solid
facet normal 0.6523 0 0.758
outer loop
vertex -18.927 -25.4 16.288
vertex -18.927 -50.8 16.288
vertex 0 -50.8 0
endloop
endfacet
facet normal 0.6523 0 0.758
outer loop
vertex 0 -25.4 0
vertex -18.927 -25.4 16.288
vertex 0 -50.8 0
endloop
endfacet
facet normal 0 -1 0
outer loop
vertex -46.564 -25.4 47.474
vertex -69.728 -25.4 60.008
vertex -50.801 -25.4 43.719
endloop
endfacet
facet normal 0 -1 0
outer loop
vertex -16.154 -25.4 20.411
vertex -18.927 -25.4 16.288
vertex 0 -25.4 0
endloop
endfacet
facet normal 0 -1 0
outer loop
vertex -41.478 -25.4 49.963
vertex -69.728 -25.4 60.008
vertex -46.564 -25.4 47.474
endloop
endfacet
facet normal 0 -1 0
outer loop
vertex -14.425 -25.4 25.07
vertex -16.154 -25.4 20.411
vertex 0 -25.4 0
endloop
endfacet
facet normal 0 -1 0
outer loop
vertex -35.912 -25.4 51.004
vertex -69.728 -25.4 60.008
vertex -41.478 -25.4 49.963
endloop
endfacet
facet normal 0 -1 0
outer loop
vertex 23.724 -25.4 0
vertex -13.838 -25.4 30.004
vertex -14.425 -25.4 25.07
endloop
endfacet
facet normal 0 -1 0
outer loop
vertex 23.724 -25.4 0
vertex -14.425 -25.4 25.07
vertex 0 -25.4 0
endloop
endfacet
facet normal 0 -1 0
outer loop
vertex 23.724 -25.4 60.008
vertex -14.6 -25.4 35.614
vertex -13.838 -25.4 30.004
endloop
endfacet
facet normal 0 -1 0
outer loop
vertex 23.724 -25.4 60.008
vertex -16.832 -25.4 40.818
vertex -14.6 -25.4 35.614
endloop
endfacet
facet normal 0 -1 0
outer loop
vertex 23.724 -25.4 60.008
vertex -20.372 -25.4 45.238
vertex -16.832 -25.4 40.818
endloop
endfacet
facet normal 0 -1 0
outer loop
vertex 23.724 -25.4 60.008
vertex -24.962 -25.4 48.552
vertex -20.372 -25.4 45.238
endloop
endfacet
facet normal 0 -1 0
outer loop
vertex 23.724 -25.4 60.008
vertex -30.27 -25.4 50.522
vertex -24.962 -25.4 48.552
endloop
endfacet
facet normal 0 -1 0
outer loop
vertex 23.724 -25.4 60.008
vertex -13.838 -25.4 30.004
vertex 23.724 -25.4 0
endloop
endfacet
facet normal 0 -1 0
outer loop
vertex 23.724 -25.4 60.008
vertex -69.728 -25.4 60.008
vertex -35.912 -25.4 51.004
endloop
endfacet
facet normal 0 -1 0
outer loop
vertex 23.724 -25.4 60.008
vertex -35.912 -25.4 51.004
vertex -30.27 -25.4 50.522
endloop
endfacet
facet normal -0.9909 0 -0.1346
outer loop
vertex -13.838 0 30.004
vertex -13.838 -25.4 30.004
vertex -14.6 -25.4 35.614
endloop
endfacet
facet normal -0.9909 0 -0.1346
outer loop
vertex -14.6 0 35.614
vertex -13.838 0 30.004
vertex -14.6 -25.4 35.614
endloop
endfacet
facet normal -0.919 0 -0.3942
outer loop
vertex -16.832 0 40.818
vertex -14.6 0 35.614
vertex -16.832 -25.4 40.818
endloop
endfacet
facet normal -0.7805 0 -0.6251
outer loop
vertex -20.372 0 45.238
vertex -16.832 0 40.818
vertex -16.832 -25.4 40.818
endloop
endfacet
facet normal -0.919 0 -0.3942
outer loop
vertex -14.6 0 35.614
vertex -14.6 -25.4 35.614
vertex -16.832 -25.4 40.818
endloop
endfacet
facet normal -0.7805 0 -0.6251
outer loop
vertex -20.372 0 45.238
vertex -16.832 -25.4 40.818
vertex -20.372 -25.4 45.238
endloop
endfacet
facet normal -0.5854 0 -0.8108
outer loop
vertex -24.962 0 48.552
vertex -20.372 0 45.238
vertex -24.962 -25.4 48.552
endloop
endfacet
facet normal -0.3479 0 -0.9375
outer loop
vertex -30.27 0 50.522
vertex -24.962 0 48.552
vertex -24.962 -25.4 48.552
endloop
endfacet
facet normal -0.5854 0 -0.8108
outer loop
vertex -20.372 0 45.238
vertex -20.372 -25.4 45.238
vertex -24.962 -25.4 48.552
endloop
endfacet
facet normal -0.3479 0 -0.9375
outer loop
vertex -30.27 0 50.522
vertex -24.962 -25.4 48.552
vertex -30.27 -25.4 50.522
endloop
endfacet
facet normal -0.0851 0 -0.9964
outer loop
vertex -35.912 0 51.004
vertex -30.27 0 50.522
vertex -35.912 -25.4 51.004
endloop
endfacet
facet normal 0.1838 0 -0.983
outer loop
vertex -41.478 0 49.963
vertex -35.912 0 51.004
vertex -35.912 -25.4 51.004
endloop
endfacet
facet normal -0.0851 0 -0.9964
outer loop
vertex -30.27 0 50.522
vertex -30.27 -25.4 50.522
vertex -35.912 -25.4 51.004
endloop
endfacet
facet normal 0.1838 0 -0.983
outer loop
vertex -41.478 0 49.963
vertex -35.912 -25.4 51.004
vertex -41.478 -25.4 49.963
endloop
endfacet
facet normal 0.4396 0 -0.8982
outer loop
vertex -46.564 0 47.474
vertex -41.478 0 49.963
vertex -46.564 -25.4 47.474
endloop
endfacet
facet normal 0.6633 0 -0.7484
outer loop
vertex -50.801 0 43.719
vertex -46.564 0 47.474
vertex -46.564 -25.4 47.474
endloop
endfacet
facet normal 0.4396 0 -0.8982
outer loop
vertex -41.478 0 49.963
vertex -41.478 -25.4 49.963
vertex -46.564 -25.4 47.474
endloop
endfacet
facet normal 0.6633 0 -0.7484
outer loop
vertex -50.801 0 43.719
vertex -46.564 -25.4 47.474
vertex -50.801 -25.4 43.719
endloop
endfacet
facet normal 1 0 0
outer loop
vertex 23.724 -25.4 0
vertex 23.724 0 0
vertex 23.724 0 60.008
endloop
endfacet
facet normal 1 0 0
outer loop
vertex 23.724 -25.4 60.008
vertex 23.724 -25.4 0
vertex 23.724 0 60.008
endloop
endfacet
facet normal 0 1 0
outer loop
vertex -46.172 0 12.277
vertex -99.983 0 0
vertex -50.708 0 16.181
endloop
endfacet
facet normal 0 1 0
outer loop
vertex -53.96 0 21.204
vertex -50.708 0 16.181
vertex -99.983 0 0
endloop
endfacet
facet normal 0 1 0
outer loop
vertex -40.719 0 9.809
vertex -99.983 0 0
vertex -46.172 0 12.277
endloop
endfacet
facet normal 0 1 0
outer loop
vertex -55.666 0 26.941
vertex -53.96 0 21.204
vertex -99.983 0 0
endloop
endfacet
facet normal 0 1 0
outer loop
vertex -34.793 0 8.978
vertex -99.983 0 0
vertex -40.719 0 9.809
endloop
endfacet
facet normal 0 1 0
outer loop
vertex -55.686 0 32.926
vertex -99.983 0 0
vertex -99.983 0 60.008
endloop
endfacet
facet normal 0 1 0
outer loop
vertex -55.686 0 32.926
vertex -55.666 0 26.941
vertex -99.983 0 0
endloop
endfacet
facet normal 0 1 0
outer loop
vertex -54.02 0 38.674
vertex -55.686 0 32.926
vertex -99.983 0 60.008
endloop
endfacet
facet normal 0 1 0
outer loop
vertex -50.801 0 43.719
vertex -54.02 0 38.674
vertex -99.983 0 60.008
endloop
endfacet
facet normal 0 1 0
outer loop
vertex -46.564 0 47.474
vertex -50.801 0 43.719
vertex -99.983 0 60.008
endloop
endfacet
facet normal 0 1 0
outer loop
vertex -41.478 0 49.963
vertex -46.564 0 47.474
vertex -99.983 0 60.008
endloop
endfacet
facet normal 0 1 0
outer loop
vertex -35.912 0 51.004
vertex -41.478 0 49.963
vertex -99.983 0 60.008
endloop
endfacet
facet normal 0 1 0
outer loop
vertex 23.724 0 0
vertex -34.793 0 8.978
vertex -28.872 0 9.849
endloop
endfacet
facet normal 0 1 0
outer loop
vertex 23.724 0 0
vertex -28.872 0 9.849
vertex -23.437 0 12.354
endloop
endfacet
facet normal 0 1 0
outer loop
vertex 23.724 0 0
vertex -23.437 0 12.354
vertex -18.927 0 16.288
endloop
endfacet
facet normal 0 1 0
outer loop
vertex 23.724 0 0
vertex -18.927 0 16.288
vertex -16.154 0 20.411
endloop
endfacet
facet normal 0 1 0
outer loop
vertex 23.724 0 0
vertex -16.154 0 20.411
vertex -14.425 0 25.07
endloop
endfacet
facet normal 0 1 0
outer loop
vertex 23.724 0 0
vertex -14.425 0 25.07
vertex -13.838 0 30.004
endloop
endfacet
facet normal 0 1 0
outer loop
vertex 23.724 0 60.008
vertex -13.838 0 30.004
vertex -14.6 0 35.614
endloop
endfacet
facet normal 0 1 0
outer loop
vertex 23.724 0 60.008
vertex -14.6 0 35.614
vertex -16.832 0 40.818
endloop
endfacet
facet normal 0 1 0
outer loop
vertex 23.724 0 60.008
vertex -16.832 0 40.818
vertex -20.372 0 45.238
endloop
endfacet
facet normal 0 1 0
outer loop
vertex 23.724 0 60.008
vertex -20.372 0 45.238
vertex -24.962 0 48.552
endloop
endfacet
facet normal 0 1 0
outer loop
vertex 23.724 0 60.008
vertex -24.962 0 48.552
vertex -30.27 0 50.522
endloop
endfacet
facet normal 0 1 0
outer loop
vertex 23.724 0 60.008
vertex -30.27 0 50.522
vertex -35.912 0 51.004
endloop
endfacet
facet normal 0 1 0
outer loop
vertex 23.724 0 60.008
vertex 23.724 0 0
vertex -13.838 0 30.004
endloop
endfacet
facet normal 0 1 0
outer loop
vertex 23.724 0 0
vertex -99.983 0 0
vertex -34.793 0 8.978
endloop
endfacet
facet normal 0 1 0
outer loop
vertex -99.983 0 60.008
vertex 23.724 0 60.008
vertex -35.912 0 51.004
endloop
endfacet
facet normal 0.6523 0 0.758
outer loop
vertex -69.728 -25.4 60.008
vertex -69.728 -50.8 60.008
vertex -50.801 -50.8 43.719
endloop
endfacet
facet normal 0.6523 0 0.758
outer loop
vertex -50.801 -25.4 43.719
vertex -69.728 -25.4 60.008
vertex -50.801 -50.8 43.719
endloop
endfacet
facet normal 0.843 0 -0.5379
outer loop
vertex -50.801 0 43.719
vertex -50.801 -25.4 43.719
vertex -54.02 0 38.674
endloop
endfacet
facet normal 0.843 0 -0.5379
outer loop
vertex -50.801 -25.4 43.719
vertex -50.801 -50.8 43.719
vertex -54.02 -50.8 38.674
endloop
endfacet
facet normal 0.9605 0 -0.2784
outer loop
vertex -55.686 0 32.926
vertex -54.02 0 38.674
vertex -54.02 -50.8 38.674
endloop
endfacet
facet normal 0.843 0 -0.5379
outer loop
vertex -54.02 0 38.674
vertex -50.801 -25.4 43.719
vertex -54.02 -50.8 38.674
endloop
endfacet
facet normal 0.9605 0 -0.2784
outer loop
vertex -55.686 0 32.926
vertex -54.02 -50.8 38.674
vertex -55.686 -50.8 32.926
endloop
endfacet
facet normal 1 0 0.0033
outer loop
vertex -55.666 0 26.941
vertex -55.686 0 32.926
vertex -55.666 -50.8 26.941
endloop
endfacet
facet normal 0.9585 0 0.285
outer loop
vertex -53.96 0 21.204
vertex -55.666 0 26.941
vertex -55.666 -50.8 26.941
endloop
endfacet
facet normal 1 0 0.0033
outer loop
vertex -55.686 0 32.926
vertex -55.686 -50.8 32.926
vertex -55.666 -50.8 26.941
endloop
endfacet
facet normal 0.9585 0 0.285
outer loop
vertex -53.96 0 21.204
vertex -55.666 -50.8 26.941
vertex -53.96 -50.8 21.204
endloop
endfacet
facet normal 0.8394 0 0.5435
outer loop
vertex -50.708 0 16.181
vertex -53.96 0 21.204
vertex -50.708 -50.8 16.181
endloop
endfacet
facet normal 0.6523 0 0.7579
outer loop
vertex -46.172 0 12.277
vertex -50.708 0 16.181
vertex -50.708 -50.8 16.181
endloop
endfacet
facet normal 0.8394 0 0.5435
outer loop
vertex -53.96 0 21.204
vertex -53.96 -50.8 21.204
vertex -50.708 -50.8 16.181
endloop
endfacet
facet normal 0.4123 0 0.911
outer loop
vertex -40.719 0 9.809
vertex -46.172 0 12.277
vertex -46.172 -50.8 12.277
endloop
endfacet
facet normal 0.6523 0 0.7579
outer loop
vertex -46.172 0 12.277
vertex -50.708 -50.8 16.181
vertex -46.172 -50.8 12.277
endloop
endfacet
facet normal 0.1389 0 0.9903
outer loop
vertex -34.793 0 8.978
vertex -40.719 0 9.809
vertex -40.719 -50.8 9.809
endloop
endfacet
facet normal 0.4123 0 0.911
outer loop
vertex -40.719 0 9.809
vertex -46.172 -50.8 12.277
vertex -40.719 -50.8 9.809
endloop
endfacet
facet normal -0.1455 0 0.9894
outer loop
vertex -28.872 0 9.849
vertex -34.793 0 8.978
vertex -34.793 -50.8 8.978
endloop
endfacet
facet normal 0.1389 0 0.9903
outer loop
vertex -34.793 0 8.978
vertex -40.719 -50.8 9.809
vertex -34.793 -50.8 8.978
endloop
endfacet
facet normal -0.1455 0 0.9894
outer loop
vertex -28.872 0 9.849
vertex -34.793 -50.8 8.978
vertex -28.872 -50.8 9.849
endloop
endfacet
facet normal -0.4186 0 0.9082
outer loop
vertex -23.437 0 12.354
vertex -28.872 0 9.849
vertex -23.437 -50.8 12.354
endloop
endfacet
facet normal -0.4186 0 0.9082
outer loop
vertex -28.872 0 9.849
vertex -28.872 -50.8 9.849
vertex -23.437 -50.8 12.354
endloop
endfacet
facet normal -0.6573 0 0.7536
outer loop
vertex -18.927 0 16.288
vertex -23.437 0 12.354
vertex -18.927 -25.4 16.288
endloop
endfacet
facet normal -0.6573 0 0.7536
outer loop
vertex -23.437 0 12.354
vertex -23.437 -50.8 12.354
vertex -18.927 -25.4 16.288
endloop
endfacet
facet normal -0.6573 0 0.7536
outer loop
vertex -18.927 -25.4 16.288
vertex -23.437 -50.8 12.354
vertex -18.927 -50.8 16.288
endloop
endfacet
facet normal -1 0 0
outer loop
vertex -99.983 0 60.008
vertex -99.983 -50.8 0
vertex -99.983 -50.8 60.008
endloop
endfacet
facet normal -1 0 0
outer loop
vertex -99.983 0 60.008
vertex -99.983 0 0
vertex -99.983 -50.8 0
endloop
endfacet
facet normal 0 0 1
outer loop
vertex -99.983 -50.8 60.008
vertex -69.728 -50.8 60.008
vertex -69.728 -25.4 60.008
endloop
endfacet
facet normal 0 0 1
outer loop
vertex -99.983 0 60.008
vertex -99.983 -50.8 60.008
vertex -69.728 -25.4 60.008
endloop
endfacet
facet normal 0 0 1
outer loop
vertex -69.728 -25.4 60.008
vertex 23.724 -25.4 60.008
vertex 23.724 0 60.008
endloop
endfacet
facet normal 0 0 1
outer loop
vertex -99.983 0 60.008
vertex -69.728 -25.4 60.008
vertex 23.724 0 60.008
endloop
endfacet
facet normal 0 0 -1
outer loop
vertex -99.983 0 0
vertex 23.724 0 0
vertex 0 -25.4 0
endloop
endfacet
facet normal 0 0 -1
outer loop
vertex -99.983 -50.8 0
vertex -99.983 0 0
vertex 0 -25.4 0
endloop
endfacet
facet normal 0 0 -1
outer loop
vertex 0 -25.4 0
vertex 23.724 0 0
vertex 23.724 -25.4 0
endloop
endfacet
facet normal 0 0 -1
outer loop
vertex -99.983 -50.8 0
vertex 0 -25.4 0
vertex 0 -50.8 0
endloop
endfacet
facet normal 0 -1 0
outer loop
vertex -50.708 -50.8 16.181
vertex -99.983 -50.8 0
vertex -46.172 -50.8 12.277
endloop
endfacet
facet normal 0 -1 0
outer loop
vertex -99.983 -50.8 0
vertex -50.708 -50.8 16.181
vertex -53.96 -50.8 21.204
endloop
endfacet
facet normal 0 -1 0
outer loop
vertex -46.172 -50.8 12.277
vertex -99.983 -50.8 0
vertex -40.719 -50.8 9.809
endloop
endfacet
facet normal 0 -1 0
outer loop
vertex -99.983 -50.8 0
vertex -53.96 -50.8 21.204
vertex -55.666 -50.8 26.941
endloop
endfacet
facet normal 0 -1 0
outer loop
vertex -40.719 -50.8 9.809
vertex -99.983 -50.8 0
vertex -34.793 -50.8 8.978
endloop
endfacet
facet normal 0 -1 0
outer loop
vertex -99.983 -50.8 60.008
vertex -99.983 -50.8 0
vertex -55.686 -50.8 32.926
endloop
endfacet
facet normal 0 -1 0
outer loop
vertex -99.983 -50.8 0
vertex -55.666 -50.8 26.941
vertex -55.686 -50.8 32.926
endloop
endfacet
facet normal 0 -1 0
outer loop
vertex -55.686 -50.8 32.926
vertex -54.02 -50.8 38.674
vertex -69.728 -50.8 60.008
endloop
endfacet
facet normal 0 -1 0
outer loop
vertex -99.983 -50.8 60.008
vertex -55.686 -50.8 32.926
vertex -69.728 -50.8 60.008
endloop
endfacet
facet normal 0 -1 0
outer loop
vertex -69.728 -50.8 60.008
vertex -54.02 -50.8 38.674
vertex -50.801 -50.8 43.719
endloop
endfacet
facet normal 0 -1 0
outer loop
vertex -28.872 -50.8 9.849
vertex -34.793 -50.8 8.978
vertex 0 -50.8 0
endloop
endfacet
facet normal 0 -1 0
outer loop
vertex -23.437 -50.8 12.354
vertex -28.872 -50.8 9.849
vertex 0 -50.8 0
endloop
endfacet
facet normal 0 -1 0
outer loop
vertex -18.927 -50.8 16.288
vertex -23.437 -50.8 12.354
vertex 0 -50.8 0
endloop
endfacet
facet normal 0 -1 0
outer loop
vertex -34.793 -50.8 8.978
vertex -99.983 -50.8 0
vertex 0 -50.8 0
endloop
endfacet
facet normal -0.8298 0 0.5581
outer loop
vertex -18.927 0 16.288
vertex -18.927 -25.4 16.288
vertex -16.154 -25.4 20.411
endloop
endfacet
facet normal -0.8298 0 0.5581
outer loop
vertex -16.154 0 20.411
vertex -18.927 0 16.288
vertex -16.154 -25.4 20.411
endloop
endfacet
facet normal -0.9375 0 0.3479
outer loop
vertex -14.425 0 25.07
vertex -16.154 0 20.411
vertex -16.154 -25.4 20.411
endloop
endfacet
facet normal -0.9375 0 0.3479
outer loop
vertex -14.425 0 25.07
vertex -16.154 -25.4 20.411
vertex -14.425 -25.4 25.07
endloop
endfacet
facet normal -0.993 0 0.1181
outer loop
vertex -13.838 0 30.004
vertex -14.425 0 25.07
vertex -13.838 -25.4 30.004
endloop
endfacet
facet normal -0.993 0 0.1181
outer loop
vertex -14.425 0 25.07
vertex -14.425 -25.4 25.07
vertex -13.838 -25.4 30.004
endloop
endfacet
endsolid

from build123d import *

# Parameters (mm, degrees)
F0_W     = 98.3068589121
F0_H     = 60.0075013936
F1_DEPTH = 25.4
F2_DEPTH = 25.4
F3_DEPTH = 25.4
F5_DEPTH = 25.4
F7_DEPTH = 58.166


with BuildPart() as f1:
    # F0 (on Front) → F1 (new body)
    with BuildSketch(Plane.XZ):
        with Locations((-25.4295347258, 30.0037506968)):
            Rectangle(F0_W, F0_H)
    extrude(amount=F1_DEPTH)

    # F2 (add): a face of the model
    f2_faces = [f1.faces().sort_by_distance(p)[0] for p in [
        (-25.4295347258, -25.4, 30.0037506968),
    ]]
    extrude(f2_faces, amount=F2_DEPTH)

    # F3 (add): a face of the model
    f3_faces = [f1.faces().sort_by_distance(p)[0] for p in [
        (-74.5829641819, -25.4, 30.0037506968),
    ]]
    extrude(f3_faces, amount=F3_DEPTH)

    # F4 (on face) → F5 (cut)
    with BuildSketch(Plane.XZ.offset(50.8)):
        Polygon((23.7238947302, 60.0075013936), (-69.7281658649, 60.0075013936), (0, 0), (23.7238947302, 0), align=None)
    extrude(amount=-F5_DEPTH, mode=Mode.SUBTRACT)

    # F6 (on face) → F7 (cut)
    with BuildSketch(Plane.XZ.offset(50.8)):
        with BuildLine():
            Line((-18.9269924475, 16.2884181963), (-50.8011734174, 43.7190831973))
            ThreePointArc((-50.8011734174, 43.7190831973), (-48.579415433, 14.0666602118), (-18.9269924475, 16.2884181963))
        make_face()
        with BuildLine():
            ThreePointArc((-18.9269924475, 16.2884181963), (-15.1511722743, 22.6892204926), (-13.8378802624, 30.0037506968))
            ThreePointArc((-13.8378802624, 30.0037506968), (-27.5495527283, 49.716661355), (-50.8011734174, 43.7190831973))
            Line((-50.8011734174, 43.7190831973), (-18.9269924475, 16.2884181963))
        make_face()
    extrude(amount=-F7_DEPTH, mode=Mode.SUBTRACT)


solid = f1.part
